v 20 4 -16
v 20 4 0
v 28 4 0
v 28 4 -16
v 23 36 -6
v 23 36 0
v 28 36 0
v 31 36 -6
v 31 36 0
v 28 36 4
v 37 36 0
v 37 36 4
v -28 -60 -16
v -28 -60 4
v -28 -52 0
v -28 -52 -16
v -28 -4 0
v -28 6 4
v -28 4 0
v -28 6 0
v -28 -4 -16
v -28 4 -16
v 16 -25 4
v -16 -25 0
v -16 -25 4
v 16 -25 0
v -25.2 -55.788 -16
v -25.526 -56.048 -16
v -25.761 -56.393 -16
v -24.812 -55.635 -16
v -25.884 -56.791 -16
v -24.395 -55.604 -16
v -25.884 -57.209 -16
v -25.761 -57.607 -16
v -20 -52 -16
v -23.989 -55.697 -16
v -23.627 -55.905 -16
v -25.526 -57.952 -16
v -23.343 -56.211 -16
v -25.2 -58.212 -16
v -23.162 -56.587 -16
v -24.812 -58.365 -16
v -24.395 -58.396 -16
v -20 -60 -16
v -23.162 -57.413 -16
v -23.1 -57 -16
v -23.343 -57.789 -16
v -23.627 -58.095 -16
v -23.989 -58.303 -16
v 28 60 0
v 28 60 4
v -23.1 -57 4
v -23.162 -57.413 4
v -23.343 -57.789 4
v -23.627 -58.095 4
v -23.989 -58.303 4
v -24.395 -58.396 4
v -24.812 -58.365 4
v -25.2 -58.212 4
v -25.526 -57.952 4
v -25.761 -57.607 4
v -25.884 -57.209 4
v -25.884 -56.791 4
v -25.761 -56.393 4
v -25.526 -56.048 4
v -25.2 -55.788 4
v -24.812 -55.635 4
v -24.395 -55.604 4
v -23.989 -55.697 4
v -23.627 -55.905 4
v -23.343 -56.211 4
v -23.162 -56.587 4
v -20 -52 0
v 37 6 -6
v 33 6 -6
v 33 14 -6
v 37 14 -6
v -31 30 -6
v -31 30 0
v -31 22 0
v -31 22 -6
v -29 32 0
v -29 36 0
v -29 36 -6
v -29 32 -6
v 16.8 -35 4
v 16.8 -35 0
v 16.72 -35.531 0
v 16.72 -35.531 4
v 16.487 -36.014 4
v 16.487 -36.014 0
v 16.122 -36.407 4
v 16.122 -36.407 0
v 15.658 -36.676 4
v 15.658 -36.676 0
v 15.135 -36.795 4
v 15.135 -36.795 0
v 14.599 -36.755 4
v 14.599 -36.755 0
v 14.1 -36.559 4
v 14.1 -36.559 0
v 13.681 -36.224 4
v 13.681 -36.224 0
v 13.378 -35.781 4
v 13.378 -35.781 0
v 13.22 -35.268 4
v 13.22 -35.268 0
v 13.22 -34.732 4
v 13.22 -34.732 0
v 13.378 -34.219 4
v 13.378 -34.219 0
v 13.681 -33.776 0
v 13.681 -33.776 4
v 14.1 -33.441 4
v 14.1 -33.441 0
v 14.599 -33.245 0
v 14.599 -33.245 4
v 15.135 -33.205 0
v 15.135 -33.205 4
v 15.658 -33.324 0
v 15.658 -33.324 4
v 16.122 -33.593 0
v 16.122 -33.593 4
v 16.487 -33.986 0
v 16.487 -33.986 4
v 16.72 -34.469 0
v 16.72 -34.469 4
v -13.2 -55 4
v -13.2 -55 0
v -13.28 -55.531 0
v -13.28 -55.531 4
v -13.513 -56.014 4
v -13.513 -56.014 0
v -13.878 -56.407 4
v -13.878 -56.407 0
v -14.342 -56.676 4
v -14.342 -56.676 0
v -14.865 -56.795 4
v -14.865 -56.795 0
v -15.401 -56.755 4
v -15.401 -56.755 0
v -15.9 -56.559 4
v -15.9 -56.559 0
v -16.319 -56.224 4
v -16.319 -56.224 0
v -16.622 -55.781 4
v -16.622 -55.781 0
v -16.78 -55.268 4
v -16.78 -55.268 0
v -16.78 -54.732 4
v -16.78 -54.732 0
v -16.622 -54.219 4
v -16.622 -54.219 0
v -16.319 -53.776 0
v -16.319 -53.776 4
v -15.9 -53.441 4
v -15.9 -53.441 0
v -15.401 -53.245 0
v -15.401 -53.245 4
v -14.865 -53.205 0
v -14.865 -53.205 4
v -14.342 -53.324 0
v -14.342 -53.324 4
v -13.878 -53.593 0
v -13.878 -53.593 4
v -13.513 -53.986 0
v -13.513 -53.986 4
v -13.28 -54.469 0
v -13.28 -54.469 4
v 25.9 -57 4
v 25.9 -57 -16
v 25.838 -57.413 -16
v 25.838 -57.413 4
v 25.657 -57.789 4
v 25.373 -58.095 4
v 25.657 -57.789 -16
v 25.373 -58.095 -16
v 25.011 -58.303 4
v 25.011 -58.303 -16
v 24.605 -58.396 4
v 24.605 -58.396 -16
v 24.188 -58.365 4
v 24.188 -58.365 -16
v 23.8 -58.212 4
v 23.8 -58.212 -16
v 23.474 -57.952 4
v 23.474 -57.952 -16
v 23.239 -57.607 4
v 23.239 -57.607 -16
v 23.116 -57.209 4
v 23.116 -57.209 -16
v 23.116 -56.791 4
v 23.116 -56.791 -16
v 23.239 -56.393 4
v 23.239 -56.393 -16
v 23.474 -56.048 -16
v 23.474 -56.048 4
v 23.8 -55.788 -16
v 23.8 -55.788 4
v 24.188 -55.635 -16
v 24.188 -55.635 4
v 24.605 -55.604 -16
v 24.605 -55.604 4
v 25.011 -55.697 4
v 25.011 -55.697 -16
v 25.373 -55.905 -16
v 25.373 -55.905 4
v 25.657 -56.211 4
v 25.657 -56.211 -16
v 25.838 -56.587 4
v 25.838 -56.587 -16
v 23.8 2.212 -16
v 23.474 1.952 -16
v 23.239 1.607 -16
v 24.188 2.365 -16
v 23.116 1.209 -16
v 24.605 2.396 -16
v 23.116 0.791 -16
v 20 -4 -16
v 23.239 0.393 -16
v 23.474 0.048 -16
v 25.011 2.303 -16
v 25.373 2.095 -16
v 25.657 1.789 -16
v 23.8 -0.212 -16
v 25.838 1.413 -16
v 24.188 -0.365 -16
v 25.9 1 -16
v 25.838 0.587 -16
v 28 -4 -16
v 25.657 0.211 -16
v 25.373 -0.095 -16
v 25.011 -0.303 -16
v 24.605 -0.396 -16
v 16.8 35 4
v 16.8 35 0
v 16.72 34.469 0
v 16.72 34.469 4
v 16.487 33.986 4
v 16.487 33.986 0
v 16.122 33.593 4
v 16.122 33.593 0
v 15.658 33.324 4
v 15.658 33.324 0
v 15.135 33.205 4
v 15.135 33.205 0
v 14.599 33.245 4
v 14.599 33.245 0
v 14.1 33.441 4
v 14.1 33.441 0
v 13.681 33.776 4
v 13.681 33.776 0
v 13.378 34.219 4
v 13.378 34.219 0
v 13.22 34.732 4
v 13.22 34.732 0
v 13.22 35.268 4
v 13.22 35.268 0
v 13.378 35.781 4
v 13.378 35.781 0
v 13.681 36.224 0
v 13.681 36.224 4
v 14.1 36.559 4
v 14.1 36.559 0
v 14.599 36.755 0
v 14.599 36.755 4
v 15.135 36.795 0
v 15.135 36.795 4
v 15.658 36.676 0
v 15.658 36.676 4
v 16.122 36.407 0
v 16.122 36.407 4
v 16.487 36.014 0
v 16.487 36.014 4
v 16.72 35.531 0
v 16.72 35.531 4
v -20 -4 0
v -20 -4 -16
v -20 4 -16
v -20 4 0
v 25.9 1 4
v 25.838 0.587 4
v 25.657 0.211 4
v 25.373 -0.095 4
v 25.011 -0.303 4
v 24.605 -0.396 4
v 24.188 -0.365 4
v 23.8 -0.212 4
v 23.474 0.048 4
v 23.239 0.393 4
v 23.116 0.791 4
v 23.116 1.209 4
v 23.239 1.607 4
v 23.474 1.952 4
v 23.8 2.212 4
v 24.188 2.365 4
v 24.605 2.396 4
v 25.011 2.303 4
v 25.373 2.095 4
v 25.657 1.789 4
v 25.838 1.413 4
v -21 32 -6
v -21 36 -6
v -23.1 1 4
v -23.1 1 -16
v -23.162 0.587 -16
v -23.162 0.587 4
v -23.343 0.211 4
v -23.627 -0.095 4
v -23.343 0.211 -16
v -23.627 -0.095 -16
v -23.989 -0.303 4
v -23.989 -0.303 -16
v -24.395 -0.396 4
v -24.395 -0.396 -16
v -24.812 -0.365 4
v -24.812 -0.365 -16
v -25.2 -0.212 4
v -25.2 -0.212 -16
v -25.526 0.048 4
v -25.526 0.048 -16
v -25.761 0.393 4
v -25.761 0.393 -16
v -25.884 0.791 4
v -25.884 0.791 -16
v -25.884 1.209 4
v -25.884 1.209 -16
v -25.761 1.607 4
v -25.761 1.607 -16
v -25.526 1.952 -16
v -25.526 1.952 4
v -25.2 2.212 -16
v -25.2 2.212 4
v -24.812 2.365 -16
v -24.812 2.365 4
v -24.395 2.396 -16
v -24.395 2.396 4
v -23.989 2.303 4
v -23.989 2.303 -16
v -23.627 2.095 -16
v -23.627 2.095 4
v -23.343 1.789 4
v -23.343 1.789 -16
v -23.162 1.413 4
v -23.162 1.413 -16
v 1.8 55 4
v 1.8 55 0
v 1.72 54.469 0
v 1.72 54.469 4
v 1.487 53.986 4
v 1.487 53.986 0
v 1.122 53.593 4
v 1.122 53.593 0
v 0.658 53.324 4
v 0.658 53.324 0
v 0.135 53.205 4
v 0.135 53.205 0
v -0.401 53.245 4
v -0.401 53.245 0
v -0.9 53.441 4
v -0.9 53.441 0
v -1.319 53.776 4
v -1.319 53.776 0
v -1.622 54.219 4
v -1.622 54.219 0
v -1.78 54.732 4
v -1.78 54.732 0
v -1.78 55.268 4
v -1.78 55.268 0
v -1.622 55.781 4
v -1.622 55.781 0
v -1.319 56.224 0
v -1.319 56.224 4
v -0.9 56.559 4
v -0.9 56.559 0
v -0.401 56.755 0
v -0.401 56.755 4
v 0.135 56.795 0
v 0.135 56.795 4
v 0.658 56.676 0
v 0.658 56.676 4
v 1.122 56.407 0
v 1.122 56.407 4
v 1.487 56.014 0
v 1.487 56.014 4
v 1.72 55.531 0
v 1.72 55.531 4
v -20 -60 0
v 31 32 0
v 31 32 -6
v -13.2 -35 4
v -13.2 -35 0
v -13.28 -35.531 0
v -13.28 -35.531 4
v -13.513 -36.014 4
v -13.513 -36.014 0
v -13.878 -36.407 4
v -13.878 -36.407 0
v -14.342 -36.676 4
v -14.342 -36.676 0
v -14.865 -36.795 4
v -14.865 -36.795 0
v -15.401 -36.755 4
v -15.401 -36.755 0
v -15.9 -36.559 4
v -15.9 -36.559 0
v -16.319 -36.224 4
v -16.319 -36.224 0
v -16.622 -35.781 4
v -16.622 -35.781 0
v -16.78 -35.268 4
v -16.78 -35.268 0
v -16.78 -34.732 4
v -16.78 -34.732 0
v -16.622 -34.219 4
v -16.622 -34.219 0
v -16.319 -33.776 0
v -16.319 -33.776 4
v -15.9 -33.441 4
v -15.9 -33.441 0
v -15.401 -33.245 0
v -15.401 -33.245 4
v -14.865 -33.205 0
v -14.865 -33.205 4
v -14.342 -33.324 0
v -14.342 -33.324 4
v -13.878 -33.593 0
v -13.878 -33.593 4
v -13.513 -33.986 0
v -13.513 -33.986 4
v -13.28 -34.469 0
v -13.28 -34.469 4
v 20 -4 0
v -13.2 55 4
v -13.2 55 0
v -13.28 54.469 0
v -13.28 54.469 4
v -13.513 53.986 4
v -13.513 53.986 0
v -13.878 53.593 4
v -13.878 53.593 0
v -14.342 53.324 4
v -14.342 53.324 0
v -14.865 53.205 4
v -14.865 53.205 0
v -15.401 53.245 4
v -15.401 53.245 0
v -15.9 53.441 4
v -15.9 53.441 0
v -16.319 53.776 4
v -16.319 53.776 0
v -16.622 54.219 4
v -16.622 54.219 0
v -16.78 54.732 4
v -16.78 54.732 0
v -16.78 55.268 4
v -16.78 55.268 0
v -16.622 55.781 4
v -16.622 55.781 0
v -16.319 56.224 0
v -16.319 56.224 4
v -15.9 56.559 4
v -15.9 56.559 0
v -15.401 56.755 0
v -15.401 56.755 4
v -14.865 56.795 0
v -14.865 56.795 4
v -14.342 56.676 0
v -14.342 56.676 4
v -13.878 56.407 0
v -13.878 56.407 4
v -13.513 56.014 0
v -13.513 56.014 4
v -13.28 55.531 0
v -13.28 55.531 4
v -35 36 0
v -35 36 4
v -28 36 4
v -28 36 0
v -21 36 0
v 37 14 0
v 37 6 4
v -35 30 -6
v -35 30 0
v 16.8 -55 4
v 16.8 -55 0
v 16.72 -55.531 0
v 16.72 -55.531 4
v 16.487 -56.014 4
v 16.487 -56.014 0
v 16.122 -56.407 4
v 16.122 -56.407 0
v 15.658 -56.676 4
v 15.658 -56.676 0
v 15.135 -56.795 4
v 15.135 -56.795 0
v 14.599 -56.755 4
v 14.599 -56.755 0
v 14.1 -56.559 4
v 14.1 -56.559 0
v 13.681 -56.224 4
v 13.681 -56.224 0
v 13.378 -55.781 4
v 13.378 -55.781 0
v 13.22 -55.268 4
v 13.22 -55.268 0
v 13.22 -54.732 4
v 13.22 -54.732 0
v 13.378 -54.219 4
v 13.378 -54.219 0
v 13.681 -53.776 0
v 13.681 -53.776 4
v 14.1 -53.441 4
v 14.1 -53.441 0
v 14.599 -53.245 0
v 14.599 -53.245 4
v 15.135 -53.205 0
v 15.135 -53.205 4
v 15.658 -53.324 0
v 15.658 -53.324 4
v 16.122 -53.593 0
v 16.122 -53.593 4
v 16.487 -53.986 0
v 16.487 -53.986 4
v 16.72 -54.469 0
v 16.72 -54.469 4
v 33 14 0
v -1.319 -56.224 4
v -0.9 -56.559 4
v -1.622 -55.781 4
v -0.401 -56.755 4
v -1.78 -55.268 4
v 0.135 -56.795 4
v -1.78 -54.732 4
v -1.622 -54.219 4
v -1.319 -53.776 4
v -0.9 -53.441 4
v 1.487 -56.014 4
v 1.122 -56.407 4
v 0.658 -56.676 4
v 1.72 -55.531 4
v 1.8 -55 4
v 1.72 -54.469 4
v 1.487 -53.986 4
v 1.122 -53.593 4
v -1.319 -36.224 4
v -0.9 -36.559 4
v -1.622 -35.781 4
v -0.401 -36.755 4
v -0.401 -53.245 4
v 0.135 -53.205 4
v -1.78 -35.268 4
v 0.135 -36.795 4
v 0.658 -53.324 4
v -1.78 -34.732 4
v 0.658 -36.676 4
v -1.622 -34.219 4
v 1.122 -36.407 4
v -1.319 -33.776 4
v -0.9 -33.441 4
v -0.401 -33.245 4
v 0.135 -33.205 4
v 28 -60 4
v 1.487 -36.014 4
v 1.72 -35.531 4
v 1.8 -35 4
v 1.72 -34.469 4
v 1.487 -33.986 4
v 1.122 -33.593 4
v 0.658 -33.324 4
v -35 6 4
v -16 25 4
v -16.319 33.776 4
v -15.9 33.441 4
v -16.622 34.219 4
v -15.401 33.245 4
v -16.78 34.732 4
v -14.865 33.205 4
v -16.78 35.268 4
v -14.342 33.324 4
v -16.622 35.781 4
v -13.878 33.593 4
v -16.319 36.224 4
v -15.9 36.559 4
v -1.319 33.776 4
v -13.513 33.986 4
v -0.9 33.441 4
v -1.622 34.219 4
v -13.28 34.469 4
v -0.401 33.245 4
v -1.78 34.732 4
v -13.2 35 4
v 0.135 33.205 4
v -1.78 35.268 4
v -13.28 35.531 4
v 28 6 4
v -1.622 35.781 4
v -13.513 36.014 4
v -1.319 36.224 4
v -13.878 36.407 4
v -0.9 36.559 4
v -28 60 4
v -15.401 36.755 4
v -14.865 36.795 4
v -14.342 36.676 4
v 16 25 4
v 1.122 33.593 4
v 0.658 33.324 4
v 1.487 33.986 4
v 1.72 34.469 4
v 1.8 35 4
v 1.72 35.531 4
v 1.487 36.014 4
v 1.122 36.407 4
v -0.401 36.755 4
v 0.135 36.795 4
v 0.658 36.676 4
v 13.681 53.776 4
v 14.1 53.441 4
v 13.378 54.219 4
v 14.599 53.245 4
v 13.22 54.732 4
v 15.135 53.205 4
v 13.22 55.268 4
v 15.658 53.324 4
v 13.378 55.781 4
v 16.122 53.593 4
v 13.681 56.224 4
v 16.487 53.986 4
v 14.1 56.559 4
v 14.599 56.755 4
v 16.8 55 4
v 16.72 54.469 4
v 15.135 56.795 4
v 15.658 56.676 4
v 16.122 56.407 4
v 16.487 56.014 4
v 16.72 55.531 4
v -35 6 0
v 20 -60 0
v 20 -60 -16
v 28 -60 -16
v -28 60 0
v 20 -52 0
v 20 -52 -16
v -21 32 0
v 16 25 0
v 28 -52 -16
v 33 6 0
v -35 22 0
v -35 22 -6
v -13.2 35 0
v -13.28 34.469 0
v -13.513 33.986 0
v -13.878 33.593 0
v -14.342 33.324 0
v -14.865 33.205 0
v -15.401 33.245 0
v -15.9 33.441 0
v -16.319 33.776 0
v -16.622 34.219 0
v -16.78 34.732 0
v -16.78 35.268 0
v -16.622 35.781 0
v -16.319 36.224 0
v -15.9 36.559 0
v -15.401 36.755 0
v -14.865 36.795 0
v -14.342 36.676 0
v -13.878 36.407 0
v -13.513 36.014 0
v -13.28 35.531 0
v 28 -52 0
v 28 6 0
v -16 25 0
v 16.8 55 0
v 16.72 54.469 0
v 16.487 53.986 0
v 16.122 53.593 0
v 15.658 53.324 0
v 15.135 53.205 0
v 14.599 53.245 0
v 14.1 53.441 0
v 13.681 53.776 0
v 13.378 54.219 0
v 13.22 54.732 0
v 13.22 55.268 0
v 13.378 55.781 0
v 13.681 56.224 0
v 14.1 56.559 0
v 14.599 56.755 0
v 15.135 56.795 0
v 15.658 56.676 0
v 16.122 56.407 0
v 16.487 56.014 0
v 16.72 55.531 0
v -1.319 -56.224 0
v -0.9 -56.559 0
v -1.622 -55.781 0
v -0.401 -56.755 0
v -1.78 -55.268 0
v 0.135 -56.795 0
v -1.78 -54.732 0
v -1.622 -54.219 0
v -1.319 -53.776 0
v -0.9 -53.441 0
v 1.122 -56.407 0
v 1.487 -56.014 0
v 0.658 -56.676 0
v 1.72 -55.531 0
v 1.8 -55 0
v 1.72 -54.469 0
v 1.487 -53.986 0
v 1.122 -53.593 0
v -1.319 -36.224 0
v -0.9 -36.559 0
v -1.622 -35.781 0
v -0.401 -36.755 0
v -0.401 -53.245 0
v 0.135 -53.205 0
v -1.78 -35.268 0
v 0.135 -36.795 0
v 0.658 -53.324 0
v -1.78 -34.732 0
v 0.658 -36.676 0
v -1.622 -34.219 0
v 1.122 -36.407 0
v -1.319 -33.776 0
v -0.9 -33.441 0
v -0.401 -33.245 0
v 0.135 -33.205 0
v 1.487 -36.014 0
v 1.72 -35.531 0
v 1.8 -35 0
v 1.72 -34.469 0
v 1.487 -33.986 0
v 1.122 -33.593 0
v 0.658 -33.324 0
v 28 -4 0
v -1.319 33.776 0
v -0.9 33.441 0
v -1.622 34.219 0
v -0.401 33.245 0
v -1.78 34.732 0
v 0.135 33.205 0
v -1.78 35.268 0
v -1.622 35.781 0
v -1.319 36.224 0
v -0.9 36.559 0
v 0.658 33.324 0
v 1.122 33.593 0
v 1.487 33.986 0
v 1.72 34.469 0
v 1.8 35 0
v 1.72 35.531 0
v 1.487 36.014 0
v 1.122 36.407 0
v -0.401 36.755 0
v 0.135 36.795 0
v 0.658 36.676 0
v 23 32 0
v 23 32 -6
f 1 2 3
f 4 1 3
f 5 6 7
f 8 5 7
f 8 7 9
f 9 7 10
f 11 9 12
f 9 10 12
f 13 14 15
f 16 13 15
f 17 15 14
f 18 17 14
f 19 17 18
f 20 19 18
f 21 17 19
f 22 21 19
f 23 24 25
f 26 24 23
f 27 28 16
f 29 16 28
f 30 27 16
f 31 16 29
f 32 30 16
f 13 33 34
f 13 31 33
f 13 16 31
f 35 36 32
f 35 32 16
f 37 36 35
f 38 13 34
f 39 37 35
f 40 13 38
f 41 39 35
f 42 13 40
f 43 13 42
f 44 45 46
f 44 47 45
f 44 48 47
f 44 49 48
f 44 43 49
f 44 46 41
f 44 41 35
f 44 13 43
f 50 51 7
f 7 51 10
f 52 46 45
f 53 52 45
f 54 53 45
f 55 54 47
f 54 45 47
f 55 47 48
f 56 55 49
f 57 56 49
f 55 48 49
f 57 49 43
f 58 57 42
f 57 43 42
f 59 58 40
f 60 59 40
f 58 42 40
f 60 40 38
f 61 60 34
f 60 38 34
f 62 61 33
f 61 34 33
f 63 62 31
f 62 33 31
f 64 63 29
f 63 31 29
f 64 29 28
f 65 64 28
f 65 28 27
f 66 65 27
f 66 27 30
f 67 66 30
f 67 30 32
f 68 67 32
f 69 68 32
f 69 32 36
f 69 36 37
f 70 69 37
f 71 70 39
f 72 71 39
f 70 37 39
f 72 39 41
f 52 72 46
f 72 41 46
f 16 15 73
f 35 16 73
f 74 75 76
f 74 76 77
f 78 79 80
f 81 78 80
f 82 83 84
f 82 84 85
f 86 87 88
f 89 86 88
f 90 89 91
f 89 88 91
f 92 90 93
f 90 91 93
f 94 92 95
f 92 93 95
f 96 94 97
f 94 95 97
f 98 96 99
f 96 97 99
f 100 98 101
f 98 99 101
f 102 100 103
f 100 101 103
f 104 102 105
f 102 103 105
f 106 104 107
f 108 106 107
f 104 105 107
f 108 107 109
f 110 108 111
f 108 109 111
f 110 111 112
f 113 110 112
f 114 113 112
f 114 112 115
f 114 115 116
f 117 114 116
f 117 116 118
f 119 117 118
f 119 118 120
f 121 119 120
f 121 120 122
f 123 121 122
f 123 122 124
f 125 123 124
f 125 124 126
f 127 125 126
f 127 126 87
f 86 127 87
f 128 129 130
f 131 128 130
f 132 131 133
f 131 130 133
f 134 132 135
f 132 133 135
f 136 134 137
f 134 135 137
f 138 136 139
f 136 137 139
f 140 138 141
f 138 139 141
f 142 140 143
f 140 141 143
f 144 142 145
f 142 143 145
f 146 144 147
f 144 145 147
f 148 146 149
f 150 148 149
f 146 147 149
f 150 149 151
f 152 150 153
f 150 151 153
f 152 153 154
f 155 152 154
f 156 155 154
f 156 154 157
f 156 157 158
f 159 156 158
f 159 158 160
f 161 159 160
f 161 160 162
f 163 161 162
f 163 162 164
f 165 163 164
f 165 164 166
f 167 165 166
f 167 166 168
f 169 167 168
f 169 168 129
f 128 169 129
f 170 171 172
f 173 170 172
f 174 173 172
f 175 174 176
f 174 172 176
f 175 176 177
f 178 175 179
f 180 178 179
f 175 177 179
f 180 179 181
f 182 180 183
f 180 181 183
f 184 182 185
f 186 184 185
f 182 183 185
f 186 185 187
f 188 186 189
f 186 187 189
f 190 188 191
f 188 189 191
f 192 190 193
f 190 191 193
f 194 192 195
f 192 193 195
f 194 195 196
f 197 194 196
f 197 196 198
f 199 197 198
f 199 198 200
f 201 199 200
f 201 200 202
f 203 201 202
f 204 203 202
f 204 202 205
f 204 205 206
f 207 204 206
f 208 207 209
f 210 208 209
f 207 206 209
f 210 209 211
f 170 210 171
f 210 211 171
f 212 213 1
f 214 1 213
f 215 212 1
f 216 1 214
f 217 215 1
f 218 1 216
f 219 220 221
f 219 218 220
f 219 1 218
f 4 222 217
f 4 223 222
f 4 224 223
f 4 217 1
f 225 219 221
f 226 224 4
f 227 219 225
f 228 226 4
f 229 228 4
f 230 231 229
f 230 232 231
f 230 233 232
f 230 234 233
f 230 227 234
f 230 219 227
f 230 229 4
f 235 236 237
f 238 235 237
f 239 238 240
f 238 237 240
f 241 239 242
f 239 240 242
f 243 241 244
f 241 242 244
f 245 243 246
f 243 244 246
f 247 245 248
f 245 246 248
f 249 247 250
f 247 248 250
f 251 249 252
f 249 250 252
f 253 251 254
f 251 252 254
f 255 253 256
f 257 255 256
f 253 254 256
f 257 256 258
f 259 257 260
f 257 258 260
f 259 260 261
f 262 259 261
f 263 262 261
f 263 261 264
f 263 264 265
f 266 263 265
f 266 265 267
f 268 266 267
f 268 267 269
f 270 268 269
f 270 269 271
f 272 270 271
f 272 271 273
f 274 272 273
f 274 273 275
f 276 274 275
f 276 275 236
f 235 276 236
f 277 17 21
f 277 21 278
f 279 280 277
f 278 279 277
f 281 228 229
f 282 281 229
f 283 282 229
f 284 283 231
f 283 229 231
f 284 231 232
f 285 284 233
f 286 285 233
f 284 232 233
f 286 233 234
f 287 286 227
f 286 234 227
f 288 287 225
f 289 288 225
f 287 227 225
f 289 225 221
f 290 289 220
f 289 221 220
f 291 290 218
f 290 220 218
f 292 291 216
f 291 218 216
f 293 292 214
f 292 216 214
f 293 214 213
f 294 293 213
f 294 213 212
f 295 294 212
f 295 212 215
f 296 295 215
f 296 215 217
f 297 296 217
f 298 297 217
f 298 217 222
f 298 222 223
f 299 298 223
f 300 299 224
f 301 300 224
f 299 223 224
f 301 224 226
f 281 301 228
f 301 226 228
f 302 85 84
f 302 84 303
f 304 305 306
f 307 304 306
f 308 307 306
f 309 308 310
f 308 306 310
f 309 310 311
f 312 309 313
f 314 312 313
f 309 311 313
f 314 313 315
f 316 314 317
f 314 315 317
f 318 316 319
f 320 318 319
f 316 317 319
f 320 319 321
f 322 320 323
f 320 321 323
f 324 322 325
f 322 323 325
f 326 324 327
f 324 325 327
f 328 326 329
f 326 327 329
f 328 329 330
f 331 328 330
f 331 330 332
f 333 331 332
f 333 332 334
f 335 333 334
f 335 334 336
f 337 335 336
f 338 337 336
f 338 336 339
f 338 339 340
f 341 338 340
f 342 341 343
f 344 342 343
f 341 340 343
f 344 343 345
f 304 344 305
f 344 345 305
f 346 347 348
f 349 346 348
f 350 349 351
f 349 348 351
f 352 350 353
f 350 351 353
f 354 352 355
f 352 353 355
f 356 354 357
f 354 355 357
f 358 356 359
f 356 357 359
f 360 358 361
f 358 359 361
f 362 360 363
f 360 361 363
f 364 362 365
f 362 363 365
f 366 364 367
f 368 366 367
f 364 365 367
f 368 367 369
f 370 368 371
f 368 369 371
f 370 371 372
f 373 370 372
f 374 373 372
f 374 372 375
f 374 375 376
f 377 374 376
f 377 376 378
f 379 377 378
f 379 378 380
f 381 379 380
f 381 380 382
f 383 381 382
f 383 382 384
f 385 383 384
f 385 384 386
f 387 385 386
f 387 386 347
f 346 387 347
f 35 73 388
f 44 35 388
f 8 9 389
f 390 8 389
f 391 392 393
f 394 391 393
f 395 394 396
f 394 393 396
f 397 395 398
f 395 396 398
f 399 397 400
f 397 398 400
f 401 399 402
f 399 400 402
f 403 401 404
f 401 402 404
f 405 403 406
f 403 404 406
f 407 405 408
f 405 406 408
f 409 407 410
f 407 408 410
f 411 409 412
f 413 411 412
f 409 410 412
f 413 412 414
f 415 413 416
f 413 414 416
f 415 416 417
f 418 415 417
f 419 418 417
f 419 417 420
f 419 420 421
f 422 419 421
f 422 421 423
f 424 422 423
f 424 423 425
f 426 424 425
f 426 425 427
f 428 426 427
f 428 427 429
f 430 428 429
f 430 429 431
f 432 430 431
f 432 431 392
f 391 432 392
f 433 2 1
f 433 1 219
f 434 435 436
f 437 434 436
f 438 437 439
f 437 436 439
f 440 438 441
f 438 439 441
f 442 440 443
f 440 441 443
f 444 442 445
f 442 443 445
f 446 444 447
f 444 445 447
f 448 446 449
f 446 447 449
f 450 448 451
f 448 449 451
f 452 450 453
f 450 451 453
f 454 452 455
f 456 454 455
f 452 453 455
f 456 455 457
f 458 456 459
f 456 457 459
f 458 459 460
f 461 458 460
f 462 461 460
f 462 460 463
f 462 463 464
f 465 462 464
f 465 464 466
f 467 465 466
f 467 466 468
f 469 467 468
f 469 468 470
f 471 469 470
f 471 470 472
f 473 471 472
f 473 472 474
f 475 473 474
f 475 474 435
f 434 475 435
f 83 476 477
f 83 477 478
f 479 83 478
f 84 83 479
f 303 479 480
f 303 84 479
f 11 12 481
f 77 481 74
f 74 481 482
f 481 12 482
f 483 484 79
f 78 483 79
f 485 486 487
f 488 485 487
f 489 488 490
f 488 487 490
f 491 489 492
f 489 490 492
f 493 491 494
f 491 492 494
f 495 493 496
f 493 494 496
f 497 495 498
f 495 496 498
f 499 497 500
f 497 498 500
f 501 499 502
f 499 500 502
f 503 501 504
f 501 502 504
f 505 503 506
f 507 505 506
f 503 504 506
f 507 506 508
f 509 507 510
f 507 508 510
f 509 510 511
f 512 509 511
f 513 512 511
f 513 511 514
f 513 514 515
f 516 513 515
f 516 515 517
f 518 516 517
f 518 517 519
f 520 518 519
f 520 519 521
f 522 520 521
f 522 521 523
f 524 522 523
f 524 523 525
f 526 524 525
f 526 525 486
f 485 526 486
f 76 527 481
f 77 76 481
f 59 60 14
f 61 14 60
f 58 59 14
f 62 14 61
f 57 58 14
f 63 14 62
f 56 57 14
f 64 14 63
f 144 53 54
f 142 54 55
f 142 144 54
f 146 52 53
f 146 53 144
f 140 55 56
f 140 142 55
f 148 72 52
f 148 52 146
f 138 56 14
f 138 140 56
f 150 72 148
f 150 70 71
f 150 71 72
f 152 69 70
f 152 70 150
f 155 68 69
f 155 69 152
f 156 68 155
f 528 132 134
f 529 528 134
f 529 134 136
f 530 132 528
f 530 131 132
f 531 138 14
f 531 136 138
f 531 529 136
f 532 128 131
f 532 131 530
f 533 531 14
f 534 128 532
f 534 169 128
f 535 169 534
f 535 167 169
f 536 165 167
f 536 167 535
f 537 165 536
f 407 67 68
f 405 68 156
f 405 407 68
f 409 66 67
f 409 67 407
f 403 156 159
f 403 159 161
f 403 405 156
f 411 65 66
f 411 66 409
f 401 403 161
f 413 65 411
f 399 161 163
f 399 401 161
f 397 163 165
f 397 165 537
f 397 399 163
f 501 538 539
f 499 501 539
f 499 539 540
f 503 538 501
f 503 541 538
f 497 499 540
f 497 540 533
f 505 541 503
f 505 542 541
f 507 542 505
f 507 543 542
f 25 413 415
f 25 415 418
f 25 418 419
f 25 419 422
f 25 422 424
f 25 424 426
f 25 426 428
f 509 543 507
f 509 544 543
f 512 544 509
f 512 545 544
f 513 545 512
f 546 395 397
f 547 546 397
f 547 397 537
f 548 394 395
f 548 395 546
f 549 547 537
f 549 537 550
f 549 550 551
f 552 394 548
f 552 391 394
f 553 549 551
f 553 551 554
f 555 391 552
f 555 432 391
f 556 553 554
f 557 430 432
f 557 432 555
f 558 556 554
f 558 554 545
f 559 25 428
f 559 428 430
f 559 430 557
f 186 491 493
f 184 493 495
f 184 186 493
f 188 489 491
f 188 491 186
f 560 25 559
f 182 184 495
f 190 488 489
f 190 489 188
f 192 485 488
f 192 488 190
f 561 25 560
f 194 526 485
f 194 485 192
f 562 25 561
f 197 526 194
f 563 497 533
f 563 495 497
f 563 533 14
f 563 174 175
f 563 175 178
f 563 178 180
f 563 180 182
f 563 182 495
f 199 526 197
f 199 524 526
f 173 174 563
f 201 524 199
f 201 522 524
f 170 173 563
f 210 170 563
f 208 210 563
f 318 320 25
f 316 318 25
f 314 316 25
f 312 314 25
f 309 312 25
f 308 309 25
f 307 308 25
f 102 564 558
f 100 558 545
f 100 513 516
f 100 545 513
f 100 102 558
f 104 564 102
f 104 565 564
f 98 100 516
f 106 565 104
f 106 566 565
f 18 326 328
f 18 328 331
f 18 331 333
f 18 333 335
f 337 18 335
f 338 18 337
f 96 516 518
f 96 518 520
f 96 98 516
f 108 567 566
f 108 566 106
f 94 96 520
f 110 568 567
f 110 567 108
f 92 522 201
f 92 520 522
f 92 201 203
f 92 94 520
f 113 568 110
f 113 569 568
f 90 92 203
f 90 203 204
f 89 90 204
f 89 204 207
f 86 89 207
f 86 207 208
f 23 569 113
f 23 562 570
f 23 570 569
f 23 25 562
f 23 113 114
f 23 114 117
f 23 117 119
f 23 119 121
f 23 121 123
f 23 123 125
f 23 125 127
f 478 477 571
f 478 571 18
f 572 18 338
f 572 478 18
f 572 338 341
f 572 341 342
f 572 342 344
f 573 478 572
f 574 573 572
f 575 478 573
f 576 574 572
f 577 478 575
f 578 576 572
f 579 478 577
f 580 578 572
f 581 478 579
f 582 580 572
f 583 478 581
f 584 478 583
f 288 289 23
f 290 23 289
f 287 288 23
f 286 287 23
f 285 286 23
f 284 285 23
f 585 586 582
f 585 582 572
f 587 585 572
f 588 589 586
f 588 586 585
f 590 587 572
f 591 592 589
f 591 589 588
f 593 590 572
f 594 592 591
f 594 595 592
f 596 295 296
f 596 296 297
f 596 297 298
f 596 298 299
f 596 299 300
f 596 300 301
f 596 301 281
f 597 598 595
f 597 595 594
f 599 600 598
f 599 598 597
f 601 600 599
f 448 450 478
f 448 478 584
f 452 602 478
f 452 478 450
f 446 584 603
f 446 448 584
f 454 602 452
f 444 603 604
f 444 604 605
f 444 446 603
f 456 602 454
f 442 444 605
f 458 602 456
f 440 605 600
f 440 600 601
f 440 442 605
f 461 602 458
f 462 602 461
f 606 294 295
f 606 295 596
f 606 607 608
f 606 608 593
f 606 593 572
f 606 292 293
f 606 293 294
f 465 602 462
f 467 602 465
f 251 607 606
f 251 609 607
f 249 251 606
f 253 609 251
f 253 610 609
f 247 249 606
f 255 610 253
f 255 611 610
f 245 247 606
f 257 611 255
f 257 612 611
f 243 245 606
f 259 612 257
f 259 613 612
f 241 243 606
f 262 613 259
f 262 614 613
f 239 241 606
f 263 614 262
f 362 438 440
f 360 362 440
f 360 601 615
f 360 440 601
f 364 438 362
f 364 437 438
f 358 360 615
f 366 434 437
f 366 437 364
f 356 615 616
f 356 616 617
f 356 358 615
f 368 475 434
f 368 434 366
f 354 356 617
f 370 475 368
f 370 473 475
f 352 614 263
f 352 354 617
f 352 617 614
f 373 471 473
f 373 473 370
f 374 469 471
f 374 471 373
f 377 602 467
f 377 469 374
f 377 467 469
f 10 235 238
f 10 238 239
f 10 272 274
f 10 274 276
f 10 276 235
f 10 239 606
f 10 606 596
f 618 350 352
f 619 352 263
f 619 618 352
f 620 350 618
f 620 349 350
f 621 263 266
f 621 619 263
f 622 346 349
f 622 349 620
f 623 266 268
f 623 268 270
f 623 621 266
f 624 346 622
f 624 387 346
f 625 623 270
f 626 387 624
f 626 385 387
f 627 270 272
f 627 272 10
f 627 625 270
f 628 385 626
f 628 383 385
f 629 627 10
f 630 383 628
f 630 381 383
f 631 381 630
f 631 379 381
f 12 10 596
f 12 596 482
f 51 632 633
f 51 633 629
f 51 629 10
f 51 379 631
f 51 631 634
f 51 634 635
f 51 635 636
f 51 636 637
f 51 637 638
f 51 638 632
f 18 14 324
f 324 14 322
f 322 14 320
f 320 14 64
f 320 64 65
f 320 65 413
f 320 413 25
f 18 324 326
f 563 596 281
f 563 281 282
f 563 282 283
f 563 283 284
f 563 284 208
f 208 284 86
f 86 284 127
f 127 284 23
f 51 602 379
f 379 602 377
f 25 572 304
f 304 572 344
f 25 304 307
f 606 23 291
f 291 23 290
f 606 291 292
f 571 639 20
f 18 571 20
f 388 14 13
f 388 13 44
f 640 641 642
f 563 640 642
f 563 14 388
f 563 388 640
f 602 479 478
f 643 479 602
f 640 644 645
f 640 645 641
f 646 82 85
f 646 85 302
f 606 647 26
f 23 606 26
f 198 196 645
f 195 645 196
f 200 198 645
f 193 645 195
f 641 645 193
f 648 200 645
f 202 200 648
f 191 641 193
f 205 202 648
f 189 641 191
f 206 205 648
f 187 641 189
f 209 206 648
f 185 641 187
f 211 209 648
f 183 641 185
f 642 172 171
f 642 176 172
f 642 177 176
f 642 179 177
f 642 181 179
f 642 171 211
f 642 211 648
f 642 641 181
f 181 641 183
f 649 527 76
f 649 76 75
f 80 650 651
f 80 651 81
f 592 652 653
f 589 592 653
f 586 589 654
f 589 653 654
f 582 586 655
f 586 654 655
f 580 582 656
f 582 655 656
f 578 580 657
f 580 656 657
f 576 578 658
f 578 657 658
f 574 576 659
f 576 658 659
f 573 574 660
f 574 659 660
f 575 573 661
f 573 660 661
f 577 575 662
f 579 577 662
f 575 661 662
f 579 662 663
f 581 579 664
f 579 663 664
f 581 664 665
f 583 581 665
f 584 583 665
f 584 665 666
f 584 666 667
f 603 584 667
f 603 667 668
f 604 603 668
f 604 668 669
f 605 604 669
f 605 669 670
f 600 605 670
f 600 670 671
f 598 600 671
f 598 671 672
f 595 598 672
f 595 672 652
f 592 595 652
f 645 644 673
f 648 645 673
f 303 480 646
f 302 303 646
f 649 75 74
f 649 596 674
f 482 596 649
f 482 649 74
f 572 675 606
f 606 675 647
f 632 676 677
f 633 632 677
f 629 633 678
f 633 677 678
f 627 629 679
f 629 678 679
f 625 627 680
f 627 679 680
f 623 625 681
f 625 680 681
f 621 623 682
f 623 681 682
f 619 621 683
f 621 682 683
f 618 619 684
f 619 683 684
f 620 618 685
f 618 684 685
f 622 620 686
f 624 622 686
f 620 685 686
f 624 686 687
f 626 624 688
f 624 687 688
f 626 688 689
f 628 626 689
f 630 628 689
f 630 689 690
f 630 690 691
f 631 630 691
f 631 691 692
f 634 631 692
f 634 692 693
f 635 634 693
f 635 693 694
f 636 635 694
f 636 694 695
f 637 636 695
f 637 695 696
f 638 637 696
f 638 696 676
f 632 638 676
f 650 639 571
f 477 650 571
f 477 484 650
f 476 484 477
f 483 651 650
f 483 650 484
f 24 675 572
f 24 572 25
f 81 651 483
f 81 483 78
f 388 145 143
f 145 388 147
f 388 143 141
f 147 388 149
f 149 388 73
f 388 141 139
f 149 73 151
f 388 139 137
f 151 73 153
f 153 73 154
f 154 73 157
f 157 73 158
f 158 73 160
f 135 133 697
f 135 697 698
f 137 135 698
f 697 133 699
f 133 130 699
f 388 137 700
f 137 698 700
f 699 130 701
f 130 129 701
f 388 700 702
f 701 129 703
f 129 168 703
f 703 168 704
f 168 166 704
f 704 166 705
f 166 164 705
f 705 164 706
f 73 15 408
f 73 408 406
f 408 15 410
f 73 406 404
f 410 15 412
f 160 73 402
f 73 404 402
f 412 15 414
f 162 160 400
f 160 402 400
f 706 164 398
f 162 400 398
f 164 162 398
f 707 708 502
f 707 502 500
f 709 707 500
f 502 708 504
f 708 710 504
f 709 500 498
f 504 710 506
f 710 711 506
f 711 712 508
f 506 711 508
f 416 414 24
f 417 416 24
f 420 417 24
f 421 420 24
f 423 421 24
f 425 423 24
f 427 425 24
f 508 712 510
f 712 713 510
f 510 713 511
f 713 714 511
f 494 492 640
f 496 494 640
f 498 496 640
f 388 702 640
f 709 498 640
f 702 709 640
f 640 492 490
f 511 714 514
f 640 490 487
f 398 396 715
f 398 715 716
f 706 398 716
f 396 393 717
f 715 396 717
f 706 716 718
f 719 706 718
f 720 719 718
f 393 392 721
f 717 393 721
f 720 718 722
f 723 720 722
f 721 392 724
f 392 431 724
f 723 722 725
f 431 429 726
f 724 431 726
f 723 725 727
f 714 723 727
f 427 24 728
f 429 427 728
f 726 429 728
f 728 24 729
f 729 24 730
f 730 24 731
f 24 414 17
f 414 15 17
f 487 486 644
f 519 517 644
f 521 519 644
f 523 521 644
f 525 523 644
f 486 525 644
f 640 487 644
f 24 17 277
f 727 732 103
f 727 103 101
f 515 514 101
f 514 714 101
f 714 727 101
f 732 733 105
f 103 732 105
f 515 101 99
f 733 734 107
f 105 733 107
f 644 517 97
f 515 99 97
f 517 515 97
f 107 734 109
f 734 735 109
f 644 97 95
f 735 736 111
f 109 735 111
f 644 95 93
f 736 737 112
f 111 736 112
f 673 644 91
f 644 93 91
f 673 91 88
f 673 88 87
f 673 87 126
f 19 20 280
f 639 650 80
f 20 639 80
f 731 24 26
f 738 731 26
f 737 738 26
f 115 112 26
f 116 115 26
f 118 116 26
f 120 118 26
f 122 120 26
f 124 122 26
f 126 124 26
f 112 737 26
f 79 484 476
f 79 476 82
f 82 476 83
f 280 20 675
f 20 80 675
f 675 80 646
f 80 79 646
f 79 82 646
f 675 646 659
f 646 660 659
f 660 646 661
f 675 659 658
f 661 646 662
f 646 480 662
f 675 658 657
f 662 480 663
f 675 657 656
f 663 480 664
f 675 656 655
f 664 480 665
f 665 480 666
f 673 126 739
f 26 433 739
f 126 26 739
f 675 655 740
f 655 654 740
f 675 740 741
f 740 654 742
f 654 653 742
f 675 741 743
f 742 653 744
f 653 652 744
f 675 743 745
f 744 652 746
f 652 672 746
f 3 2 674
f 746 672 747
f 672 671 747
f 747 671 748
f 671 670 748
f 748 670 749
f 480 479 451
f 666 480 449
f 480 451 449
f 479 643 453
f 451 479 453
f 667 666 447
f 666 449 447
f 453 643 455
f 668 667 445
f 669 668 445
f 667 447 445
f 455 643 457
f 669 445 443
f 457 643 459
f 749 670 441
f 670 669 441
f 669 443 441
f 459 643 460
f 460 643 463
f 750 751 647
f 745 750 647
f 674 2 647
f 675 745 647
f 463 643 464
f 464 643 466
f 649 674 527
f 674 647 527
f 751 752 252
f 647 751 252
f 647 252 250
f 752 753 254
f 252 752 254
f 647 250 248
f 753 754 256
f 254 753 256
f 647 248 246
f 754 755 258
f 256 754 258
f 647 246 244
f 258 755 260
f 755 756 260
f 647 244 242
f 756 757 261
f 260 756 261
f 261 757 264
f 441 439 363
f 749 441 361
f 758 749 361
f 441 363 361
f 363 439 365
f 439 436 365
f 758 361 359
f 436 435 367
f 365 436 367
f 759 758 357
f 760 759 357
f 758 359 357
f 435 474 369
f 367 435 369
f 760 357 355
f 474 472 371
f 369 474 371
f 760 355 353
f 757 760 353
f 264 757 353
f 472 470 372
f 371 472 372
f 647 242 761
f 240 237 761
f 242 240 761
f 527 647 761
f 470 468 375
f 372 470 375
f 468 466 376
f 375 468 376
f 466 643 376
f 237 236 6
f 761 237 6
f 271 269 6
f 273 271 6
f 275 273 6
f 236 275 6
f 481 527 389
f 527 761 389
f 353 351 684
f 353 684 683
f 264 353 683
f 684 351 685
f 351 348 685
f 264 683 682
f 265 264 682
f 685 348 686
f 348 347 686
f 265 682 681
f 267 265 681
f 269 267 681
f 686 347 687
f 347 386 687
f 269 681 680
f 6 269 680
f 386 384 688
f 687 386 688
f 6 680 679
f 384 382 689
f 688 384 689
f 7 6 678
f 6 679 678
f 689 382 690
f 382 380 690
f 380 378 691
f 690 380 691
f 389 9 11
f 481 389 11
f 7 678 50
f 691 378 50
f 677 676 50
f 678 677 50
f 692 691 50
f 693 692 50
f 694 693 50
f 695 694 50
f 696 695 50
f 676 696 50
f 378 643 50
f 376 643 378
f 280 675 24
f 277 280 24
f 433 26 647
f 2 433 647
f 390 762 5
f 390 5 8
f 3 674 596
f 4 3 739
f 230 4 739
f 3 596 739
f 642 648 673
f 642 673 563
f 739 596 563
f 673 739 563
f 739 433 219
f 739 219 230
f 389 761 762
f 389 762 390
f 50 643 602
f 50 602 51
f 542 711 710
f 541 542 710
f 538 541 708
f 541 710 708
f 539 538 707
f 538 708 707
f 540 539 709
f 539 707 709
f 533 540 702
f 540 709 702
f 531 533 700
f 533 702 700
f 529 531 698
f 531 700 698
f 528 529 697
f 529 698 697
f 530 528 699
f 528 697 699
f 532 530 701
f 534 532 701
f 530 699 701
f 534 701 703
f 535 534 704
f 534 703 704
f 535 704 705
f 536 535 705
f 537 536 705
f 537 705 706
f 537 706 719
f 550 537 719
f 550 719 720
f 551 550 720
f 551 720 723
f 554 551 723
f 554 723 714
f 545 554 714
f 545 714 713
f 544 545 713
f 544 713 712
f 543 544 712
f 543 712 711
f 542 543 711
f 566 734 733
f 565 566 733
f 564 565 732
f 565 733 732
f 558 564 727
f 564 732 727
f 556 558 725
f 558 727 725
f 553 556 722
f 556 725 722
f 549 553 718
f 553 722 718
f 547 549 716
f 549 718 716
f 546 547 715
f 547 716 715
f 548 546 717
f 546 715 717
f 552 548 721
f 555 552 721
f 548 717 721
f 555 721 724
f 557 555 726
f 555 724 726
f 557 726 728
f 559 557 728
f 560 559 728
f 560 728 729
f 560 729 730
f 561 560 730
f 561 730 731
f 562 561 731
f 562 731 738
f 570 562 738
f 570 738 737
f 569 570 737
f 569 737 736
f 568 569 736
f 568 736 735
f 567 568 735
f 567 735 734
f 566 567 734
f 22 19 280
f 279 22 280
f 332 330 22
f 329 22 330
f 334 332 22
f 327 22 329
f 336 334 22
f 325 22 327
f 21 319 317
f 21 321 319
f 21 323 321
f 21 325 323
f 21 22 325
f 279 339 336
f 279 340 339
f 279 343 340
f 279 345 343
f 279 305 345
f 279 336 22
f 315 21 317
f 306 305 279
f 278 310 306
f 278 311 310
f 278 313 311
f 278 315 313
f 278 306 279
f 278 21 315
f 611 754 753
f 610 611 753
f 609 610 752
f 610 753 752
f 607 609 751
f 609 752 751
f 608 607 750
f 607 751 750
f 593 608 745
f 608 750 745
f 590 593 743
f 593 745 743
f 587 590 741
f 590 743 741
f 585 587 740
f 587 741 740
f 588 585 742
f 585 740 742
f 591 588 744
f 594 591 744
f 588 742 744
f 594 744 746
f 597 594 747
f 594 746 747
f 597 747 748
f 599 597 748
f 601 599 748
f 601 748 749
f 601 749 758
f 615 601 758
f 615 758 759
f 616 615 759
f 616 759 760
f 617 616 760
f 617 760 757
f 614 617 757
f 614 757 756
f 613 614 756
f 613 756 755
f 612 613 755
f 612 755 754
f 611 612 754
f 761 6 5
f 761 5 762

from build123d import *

# Parameters (mm, degrees)
SKETCH_W        = 56
SKETCH_H        = 120
PAD_DEPTH       = 4
SKETCH002_W     = 8
SKETCH002_H     = 8
PAD001_DEPTH    = 16
SKETCH003_R     = 1.4
POCKET_DEPTH    = 20
SKETCH004_R     = 1.8
POCKET001_DEPTH = 5
SKETCH006_W     = 7
SKETCH006_H     = 30
SKETCH006_W_2   = 9
PAD003_DEPTH    = 4
SKETCH007_W     = 4
SKETCH007_H     = 8
SKETCH007_W_2   = 8
SKETCH007_H_2   = 4
PAD004_DEPTH    = 6
SKETCH008_W     = 32
SKETCH008_H     = 50
POCKET002_DEPTH = 5


with BuildPart() as part:
    # Sketch → Pad (new body)
    with BuildSketch(Plane.XY):
        Rectangle(SKETCH_W, SKETCH_H)
    extrude(amount=PAD_DEPTH)

    # Sketch002 → Pad001 (join)
    with BuildSketch(Plane(origin=(0, 0, 0), x_dir=(1, 0, 0), z_dir=(0, 0, -1))):
        with Locations((24, 0)):
            Rectangle(SKETCH002_W, SKETCH002_H)
        with Locations((24, 56)):
            Rectangle(SKETCH002_W, SKETCH002_H)
        with Locations((-24, 56)):
            Rectangle(SKETCH002_W, SKETCH002_H)
        with Locations((-24, 0)):
            Rectangle(SKETCH002_W, SKETCH002_H)
    extrude(amount=PAD001_DEPTH)

    # Sketch003 (on Face26 of Pad001) → Pocket (cut)
    with BuildSketch(Plane(origin=(0, 0, -16), x_dir=(1, 0, 0), z_dir=(0, 0, -1))):
        with Locations((24.5, 57)):
            Circle(SKETCH003_R)
        with Locations((24.5, -1)):
            Circle(SKETCH003_R)
        with Locations((-24.5, -1)):
            Circle(SKETCH003_R)
        with Locations((-24.5, 57)):
            Circle(SKETCH003_R)
    extrude(amount=-POCKET_DEPTH, mode=Mode.SUBTRACT)

    # Sketch004 (on Face4 of Pocket) → Pocket001 (cut)
    with BuildSketch(Plane(origin=(0, 0, 0), x_dir=(1, 0, 0), z_dir=(0, 0, -1))):
        with Locations((0, -35)):
            Circle(SKETCH004_R)
        with Locations((0, -55)):
            Circle(SKETCH004_R)
        with Locations((15, -35)):
            Circle(SKETCH004_R)
        with Locations((15, -55)):
            Circle(SKETCH004_R)
        with Locations((-15, -35)):
            Circle(SKETCH004_R)
        with Locations((-15, -55)):
            Circle(SKETCH004_R)
        with Locations((15, 55)):
            Circle(SKETCH004_R)
        with Locations((0, 55)):
            Circle(SKETCH004_R)
        with Locations((-15, 55)):
            Circle(SKETCH004_R)
        with Locations((-15, 35)):
            Circle(SKETCH004_R)
        with Locations((0, 35)):
            Circle(SKETCH004_R)
        with Locations((15, 35)):
            Circle(SKETCH004_R)
    extrude(amount=-POCKET001_DEPTH, mode=Mode.SUBTRACT)

    # Sketch006 → Pad003 (join)
    with BuildSketch(Plane.XY):
        with Locations((-31.5, 21)):
            Rectangle(SKETCH006_W, SKETCH006_H)
        with Locations((32.5, 21)):
            Rectangle(SKETCH006_W_2, SKETCH006_H)
    extrude(amount=PAD003_DEPTH)

    # Sketch007 (on Face10 of Pad003) → Pad004 (join)
    with BuildSketch(Plane(origin=(0, 0, 0), x_dir=(1, 0, 0), z_dir=(0, 0, -1))):
        with Locations((35, -10)):
            Rectangle(SKETCH007_W, SKETCH007_H)
        with Locations((-33, -26)):
            Rectangle(SKETCH007_W, SKETCH007_H)
        with Locations((27, -34)):
            Rectangle(SKETCH007_W_2, SKETCH007_H_2)
        with Locations((-25, -34)):
            Rectangle(SKETCH007_W_2, SKETCH007_H_2)
    extrude(amount=PAD004_DEPTH)

    # Sketch008 (on Face4 of Pad004) → Pocket002 (cut)
    with BuildSketch(Plane(origin=(0, 0, 0), x_dir=(1, 0, 0), z_dir=(0, 0, -1))):
        Rectangle(SKETCH008_W, SKETCH008_H)
    extrude(amount=-POCKET002_DEPTH, mode=Mode.SUBTRACT)


solid = part.part
